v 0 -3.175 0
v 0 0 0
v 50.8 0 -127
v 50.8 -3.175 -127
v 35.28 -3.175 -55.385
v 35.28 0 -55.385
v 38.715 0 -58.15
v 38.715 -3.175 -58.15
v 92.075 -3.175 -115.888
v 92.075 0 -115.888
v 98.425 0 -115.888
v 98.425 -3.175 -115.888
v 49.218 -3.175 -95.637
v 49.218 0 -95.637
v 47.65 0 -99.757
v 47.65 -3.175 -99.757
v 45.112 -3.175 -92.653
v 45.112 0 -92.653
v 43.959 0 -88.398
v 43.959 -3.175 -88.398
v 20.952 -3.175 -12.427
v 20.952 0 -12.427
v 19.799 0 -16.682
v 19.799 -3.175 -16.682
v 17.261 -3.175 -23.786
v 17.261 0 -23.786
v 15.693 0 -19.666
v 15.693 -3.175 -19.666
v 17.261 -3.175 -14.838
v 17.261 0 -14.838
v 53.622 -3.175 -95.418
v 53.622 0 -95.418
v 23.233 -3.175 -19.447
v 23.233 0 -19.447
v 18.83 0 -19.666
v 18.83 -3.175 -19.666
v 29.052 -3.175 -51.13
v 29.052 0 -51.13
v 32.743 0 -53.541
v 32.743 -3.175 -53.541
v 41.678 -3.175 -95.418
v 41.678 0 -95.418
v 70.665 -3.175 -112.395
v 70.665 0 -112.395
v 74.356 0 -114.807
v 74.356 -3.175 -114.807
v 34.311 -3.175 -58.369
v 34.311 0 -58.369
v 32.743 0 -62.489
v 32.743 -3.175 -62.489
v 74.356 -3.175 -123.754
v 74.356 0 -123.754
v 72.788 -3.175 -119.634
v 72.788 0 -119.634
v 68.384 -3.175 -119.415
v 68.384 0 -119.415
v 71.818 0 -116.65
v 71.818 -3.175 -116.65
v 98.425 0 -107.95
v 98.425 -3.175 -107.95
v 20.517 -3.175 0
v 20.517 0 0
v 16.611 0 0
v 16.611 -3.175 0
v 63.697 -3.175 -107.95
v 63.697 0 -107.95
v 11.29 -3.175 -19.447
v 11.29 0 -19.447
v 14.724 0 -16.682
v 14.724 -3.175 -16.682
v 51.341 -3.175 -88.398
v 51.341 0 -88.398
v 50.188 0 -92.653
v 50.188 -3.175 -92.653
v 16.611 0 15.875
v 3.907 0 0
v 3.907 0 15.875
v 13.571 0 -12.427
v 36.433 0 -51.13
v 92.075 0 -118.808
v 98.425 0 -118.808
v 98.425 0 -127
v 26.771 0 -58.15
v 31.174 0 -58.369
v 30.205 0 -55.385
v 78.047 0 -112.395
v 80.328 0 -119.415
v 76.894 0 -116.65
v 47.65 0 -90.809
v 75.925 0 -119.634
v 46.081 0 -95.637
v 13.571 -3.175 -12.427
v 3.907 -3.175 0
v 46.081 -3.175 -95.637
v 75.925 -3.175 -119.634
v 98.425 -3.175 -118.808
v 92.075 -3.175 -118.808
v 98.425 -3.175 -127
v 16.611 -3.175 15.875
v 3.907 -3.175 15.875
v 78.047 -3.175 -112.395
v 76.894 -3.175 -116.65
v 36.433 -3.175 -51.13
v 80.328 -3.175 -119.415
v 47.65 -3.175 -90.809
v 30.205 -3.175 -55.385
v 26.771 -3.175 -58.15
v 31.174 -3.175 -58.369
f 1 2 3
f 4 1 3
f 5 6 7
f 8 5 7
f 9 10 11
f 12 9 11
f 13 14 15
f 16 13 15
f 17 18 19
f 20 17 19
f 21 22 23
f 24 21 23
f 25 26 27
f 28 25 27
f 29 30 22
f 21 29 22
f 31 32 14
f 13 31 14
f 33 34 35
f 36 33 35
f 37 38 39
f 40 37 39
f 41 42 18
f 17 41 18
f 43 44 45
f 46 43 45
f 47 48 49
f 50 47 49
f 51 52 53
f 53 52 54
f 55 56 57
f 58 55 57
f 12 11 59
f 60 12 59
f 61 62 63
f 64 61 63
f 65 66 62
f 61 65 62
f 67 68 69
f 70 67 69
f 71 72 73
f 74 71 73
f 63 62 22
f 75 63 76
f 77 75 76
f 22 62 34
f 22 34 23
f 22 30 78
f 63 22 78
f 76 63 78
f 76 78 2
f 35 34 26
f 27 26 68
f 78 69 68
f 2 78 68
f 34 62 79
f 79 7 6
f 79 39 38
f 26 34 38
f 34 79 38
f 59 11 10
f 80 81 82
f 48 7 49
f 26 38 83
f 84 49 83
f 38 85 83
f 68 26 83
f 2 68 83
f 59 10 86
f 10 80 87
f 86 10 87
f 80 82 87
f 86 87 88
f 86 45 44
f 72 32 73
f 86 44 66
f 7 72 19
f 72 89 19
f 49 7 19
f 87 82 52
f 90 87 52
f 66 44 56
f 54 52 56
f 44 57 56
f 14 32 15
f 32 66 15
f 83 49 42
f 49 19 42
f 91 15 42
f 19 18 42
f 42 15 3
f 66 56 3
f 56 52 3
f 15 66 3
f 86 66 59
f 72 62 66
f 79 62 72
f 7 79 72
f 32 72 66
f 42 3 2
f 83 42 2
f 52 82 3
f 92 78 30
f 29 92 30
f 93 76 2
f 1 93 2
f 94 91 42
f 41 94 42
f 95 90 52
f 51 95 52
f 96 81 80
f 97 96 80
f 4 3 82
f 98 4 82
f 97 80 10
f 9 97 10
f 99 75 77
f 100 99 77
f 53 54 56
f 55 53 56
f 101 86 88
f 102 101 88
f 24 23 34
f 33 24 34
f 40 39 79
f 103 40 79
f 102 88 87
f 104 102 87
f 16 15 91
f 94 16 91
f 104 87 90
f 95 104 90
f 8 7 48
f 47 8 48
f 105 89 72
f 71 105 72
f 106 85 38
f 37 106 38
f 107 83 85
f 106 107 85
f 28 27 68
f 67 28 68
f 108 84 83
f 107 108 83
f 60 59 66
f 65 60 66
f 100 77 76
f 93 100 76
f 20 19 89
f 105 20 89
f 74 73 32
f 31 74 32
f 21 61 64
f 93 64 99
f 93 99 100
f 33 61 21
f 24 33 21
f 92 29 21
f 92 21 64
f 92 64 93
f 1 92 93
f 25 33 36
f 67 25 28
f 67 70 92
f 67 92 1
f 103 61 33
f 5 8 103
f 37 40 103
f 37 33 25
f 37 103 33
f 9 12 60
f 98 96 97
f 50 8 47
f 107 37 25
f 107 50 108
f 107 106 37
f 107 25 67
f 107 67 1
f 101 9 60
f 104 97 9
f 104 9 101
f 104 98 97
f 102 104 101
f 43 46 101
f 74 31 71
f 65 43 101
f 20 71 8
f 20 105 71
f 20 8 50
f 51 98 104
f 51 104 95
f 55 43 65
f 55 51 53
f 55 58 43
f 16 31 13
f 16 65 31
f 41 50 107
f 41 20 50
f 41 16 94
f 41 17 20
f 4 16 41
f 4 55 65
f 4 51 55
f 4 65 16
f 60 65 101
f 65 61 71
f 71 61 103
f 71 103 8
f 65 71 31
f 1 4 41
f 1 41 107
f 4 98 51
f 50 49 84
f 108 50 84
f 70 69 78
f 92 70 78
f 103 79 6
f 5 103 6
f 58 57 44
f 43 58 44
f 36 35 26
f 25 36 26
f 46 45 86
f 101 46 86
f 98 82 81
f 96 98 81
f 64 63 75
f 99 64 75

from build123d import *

# Parameters (mm, degrees)
BOSS_EXTRUDE1_DEPTH = 3.175


with BuildPart() as part:
    # Sketch1 → Boss-Extrude1 (new body)
    with BuildSketch(Plane(origin=(0, 0, 0), x_dir=(1, 0, 0), z_dir=(0, 1, 0))):
        Polygon((98.425, 127), (98.425, 118.8085), (92.075, 118.8085), (92.075, 115.8875), (98.425, 115.8875), (98.425, 107.95), (63.697477915, 107.95), (20.517477915, 0), (16.610957915, 0), (16.610957915, -15.875), (3.90652, -15.875), (3.90652, 0), (0, 0), (50.8, 127), align=None)
        Polygon((74.356304753, 123.754225326), (72.787834938, 119.633813496), (68.38440659, 119.415387337), (71.818467282, 116.65040662), (70.665468711, 112.395), (74.356304753, 114.806559768), (78.047140796, 112.395), (76.894142225, 116.65040662), (80.328202917, 119.415387337), (75.924774569, 119.633813496), align=None, mode=Mode.SUBTRACT)
        Polygon((47.649827384, 99.756946391), (46.081357569, 95.636534562), (41.67792922, 95.418108402), (45.111989912, 92.653127685), (43.958991341, 88.397721065), (47.649827384, 90.809280833), (51.340663426, 88.397721065), (50.187664855, 92.653127685), (53.621725547, 95.418108402), (49.218297199, 95.636534562), align=None, mode=Mode.SUBTRACT)
        Polygon((32.742653477, 62.489011624), (31.174183662, 58.368599795), (26.770755314, 58.150173636), (30.204816006, 55.385192919), (29.051817435, 51.129786299), (32.742653477, 53.541346066), (36.433489519, 51.129786299), (35.280490948, 55.385192919), (38.71455164, 58.150173636), (34.311123292, 58.368599795), align=None, mode=Mode.SUBTRACT)
        Polygon((17.261423317, 23.785936225), (15.692953502, 19.665524395), (11.289525154, 19.447098236), (14.723585846, 16.682117519), (13.570587275, 12.426710899), (17.261423317, 14.838270667), (20.952259359, 12.426710899), (19.799260788, 16.682117519), (23.23332148, 19.447098236), (18.829893132, 19.665524395), align=None, mode=Mode.SUBTRACT)
    extrude(amount=-BOSS_EXTRUDE1_DEPTH)


solid = part.part
